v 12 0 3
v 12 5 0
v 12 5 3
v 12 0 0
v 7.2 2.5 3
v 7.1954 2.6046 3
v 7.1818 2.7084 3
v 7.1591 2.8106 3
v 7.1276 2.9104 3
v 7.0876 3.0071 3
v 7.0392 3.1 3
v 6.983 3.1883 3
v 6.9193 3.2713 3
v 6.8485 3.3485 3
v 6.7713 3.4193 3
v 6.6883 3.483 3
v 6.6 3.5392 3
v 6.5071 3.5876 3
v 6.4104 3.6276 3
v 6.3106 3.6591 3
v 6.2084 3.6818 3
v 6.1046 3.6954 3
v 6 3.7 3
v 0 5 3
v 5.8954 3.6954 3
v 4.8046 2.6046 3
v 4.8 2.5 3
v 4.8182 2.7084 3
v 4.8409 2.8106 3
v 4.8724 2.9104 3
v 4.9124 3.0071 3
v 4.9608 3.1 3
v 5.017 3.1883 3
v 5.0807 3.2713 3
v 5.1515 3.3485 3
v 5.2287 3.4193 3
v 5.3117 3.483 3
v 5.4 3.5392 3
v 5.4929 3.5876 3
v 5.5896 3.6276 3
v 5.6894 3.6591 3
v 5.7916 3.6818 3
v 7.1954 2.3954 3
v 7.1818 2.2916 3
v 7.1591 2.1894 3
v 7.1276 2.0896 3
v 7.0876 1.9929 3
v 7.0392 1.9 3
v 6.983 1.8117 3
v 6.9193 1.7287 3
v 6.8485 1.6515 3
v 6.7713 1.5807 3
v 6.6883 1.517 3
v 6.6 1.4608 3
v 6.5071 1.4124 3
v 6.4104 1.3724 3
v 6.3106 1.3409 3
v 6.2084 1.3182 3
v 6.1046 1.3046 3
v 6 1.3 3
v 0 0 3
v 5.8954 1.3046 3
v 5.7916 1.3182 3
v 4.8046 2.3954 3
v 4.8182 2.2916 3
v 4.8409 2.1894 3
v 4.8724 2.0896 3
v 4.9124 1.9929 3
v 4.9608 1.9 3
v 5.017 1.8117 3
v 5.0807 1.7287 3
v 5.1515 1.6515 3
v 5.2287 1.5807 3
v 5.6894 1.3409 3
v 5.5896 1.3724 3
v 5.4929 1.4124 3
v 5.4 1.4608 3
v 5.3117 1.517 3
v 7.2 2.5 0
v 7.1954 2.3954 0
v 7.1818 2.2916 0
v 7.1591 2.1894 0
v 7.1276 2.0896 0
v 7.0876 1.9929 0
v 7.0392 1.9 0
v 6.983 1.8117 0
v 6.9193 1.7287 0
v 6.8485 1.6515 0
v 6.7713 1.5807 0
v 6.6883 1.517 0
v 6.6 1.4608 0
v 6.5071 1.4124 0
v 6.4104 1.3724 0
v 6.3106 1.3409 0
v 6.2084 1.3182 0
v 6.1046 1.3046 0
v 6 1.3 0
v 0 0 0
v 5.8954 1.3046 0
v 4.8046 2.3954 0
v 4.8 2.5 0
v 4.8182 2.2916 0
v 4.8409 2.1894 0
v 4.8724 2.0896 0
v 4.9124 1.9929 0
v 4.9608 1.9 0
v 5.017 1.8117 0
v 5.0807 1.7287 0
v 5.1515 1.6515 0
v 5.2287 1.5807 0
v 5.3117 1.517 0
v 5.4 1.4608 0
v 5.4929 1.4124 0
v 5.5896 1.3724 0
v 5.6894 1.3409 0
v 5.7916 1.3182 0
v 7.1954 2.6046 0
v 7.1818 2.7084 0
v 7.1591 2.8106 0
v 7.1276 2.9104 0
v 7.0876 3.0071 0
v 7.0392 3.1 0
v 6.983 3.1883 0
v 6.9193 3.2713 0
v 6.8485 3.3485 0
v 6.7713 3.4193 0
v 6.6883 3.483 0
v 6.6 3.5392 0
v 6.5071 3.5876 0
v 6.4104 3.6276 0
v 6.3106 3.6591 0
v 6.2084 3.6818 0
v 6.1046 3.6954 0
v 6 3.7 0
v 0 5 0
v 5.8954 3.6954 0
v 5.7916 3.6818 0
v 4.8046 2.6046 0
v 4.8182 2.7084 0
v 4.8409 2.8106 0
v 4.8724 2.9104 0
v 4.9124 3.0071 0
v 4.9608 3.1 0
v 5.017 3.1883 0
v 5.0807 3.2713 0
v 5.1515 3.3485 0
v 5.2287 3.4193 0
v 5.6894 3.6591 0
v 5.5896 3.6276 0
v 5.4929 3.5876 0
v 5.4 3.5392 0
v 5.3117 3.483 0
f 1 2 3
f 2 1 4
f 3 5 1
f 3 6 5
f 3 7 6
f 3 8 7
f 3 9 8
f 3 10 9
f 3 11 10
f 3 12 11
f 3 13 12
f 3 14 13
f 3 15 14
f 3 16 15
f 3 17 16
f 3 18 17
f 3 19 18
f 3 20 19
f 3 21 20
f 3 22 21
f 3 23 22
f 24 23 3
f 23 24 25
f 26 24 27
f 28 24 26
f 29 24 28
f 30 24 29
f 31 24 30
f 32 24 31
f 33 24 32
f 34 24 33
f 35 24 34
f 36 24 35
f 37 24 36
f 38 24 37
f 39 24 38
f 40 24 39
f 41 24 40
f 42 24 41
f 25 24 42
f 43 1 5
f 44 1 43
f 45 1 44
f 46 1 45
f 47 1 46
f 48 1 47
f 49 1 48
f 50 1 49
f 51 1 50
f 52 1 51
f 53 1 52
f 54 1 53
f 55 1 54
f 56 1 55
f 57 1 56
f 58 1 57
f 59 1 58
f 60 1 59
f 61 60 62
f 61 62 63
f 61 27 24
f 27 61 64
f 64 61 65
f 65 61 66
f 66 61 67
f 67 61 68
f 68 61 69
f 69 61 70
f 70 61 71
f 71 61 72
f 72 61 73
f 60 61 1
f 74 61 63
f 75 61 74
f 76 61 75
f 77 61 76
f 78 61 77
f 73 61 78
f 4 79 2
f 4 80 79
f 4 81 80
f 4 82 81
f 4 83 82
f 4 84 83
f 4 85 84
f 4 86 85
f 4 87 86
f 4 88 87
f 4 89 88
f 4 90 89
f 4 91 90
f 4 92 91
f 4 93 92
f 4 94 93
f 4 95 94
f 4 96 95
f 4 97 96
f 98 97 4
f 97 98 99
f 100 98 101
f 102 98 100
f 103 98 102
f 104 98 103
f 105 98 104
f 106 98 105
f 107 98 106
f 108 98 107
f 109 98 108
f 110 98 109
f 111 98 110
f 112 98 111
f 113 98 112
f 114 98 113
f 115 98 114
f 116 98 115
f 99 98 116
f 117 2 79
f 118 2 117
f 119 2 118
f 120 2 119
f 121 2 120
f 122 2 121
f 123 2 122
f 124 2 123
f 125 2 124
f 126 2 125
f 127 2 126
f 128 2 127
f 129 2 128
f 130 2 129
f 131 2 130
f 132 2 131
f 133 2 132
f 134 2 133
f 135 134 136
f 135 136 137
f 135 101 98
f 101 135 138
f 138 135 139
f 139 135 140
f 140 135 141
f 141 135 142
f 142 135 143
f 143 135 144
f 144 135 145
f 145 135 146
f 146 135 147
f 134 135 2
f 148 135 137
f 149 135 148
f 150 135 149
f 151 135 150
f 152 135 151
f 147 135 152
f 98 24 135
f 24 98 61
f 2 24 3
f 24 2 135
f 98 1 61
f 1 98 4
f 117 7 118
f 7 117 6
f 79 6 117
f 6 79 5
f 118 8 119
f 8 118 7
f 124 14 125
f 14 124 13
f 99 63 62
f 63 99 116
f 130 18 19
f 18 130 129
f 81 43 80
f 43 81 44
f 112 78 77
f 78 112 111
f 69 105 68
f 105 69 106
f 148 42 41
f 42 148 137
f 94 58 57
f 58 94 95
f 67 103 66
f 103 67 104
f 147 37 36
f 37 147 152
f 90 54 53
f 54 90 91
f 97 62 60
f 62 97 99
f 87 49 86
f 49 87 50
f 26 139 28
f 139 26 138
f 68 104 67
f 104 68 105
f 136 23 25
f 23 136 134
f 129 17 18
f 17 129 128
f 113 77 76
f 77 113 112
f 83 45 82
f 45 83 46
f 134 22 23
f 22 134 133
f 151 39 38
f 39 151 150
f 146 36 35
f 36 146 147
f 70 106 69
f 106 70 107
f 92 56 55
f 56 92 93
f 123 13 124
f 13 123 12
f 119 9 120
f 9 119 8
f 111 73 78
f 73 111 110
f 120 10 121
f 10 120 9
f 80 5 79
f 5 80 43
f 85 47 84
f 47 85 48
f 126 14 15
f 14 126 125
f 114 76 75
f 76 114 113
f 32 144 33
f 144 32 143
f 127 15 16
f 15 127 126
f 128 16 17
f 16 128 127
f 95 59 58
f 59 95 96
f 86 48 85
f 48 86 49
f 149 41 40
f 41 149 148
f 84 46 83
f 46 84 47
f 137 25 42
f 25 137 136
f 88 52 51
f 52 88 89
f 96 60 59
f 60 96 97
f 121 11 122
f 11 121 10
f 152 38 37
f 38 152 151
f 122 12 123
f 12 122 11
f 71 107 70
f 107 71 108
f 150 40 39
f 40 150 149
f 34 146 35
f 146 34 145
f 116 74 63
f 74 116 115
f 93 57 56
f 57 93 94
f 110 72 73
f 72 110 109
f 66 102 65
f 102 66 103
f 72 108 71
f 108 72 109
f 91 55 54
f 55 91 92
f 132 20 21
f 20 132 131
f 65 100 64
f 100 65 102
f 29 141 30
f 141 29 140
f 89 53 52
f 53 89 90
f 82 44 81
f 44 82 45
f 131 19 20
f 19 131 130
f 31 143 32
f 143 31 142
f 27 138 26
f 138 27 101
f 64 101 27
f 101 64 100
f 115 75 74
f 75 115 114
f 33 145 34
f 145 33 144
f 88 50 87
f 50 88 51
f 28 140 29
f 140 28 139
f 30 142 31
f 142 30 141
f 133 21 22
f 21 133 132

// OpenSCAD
$fa=5; $fs=0.1;

difference(){
    
    union()
    {
        cube([12, 5, 3]);
        translate([-0.1, 4.8, 1.5])
            scale([1, 1, 3])
                import("leg.dxf", convexity=3);
    }
    
    translate([6, 2.5, 1.5])
        cylinder(h=3.01, r=1.2, center=true);
}
